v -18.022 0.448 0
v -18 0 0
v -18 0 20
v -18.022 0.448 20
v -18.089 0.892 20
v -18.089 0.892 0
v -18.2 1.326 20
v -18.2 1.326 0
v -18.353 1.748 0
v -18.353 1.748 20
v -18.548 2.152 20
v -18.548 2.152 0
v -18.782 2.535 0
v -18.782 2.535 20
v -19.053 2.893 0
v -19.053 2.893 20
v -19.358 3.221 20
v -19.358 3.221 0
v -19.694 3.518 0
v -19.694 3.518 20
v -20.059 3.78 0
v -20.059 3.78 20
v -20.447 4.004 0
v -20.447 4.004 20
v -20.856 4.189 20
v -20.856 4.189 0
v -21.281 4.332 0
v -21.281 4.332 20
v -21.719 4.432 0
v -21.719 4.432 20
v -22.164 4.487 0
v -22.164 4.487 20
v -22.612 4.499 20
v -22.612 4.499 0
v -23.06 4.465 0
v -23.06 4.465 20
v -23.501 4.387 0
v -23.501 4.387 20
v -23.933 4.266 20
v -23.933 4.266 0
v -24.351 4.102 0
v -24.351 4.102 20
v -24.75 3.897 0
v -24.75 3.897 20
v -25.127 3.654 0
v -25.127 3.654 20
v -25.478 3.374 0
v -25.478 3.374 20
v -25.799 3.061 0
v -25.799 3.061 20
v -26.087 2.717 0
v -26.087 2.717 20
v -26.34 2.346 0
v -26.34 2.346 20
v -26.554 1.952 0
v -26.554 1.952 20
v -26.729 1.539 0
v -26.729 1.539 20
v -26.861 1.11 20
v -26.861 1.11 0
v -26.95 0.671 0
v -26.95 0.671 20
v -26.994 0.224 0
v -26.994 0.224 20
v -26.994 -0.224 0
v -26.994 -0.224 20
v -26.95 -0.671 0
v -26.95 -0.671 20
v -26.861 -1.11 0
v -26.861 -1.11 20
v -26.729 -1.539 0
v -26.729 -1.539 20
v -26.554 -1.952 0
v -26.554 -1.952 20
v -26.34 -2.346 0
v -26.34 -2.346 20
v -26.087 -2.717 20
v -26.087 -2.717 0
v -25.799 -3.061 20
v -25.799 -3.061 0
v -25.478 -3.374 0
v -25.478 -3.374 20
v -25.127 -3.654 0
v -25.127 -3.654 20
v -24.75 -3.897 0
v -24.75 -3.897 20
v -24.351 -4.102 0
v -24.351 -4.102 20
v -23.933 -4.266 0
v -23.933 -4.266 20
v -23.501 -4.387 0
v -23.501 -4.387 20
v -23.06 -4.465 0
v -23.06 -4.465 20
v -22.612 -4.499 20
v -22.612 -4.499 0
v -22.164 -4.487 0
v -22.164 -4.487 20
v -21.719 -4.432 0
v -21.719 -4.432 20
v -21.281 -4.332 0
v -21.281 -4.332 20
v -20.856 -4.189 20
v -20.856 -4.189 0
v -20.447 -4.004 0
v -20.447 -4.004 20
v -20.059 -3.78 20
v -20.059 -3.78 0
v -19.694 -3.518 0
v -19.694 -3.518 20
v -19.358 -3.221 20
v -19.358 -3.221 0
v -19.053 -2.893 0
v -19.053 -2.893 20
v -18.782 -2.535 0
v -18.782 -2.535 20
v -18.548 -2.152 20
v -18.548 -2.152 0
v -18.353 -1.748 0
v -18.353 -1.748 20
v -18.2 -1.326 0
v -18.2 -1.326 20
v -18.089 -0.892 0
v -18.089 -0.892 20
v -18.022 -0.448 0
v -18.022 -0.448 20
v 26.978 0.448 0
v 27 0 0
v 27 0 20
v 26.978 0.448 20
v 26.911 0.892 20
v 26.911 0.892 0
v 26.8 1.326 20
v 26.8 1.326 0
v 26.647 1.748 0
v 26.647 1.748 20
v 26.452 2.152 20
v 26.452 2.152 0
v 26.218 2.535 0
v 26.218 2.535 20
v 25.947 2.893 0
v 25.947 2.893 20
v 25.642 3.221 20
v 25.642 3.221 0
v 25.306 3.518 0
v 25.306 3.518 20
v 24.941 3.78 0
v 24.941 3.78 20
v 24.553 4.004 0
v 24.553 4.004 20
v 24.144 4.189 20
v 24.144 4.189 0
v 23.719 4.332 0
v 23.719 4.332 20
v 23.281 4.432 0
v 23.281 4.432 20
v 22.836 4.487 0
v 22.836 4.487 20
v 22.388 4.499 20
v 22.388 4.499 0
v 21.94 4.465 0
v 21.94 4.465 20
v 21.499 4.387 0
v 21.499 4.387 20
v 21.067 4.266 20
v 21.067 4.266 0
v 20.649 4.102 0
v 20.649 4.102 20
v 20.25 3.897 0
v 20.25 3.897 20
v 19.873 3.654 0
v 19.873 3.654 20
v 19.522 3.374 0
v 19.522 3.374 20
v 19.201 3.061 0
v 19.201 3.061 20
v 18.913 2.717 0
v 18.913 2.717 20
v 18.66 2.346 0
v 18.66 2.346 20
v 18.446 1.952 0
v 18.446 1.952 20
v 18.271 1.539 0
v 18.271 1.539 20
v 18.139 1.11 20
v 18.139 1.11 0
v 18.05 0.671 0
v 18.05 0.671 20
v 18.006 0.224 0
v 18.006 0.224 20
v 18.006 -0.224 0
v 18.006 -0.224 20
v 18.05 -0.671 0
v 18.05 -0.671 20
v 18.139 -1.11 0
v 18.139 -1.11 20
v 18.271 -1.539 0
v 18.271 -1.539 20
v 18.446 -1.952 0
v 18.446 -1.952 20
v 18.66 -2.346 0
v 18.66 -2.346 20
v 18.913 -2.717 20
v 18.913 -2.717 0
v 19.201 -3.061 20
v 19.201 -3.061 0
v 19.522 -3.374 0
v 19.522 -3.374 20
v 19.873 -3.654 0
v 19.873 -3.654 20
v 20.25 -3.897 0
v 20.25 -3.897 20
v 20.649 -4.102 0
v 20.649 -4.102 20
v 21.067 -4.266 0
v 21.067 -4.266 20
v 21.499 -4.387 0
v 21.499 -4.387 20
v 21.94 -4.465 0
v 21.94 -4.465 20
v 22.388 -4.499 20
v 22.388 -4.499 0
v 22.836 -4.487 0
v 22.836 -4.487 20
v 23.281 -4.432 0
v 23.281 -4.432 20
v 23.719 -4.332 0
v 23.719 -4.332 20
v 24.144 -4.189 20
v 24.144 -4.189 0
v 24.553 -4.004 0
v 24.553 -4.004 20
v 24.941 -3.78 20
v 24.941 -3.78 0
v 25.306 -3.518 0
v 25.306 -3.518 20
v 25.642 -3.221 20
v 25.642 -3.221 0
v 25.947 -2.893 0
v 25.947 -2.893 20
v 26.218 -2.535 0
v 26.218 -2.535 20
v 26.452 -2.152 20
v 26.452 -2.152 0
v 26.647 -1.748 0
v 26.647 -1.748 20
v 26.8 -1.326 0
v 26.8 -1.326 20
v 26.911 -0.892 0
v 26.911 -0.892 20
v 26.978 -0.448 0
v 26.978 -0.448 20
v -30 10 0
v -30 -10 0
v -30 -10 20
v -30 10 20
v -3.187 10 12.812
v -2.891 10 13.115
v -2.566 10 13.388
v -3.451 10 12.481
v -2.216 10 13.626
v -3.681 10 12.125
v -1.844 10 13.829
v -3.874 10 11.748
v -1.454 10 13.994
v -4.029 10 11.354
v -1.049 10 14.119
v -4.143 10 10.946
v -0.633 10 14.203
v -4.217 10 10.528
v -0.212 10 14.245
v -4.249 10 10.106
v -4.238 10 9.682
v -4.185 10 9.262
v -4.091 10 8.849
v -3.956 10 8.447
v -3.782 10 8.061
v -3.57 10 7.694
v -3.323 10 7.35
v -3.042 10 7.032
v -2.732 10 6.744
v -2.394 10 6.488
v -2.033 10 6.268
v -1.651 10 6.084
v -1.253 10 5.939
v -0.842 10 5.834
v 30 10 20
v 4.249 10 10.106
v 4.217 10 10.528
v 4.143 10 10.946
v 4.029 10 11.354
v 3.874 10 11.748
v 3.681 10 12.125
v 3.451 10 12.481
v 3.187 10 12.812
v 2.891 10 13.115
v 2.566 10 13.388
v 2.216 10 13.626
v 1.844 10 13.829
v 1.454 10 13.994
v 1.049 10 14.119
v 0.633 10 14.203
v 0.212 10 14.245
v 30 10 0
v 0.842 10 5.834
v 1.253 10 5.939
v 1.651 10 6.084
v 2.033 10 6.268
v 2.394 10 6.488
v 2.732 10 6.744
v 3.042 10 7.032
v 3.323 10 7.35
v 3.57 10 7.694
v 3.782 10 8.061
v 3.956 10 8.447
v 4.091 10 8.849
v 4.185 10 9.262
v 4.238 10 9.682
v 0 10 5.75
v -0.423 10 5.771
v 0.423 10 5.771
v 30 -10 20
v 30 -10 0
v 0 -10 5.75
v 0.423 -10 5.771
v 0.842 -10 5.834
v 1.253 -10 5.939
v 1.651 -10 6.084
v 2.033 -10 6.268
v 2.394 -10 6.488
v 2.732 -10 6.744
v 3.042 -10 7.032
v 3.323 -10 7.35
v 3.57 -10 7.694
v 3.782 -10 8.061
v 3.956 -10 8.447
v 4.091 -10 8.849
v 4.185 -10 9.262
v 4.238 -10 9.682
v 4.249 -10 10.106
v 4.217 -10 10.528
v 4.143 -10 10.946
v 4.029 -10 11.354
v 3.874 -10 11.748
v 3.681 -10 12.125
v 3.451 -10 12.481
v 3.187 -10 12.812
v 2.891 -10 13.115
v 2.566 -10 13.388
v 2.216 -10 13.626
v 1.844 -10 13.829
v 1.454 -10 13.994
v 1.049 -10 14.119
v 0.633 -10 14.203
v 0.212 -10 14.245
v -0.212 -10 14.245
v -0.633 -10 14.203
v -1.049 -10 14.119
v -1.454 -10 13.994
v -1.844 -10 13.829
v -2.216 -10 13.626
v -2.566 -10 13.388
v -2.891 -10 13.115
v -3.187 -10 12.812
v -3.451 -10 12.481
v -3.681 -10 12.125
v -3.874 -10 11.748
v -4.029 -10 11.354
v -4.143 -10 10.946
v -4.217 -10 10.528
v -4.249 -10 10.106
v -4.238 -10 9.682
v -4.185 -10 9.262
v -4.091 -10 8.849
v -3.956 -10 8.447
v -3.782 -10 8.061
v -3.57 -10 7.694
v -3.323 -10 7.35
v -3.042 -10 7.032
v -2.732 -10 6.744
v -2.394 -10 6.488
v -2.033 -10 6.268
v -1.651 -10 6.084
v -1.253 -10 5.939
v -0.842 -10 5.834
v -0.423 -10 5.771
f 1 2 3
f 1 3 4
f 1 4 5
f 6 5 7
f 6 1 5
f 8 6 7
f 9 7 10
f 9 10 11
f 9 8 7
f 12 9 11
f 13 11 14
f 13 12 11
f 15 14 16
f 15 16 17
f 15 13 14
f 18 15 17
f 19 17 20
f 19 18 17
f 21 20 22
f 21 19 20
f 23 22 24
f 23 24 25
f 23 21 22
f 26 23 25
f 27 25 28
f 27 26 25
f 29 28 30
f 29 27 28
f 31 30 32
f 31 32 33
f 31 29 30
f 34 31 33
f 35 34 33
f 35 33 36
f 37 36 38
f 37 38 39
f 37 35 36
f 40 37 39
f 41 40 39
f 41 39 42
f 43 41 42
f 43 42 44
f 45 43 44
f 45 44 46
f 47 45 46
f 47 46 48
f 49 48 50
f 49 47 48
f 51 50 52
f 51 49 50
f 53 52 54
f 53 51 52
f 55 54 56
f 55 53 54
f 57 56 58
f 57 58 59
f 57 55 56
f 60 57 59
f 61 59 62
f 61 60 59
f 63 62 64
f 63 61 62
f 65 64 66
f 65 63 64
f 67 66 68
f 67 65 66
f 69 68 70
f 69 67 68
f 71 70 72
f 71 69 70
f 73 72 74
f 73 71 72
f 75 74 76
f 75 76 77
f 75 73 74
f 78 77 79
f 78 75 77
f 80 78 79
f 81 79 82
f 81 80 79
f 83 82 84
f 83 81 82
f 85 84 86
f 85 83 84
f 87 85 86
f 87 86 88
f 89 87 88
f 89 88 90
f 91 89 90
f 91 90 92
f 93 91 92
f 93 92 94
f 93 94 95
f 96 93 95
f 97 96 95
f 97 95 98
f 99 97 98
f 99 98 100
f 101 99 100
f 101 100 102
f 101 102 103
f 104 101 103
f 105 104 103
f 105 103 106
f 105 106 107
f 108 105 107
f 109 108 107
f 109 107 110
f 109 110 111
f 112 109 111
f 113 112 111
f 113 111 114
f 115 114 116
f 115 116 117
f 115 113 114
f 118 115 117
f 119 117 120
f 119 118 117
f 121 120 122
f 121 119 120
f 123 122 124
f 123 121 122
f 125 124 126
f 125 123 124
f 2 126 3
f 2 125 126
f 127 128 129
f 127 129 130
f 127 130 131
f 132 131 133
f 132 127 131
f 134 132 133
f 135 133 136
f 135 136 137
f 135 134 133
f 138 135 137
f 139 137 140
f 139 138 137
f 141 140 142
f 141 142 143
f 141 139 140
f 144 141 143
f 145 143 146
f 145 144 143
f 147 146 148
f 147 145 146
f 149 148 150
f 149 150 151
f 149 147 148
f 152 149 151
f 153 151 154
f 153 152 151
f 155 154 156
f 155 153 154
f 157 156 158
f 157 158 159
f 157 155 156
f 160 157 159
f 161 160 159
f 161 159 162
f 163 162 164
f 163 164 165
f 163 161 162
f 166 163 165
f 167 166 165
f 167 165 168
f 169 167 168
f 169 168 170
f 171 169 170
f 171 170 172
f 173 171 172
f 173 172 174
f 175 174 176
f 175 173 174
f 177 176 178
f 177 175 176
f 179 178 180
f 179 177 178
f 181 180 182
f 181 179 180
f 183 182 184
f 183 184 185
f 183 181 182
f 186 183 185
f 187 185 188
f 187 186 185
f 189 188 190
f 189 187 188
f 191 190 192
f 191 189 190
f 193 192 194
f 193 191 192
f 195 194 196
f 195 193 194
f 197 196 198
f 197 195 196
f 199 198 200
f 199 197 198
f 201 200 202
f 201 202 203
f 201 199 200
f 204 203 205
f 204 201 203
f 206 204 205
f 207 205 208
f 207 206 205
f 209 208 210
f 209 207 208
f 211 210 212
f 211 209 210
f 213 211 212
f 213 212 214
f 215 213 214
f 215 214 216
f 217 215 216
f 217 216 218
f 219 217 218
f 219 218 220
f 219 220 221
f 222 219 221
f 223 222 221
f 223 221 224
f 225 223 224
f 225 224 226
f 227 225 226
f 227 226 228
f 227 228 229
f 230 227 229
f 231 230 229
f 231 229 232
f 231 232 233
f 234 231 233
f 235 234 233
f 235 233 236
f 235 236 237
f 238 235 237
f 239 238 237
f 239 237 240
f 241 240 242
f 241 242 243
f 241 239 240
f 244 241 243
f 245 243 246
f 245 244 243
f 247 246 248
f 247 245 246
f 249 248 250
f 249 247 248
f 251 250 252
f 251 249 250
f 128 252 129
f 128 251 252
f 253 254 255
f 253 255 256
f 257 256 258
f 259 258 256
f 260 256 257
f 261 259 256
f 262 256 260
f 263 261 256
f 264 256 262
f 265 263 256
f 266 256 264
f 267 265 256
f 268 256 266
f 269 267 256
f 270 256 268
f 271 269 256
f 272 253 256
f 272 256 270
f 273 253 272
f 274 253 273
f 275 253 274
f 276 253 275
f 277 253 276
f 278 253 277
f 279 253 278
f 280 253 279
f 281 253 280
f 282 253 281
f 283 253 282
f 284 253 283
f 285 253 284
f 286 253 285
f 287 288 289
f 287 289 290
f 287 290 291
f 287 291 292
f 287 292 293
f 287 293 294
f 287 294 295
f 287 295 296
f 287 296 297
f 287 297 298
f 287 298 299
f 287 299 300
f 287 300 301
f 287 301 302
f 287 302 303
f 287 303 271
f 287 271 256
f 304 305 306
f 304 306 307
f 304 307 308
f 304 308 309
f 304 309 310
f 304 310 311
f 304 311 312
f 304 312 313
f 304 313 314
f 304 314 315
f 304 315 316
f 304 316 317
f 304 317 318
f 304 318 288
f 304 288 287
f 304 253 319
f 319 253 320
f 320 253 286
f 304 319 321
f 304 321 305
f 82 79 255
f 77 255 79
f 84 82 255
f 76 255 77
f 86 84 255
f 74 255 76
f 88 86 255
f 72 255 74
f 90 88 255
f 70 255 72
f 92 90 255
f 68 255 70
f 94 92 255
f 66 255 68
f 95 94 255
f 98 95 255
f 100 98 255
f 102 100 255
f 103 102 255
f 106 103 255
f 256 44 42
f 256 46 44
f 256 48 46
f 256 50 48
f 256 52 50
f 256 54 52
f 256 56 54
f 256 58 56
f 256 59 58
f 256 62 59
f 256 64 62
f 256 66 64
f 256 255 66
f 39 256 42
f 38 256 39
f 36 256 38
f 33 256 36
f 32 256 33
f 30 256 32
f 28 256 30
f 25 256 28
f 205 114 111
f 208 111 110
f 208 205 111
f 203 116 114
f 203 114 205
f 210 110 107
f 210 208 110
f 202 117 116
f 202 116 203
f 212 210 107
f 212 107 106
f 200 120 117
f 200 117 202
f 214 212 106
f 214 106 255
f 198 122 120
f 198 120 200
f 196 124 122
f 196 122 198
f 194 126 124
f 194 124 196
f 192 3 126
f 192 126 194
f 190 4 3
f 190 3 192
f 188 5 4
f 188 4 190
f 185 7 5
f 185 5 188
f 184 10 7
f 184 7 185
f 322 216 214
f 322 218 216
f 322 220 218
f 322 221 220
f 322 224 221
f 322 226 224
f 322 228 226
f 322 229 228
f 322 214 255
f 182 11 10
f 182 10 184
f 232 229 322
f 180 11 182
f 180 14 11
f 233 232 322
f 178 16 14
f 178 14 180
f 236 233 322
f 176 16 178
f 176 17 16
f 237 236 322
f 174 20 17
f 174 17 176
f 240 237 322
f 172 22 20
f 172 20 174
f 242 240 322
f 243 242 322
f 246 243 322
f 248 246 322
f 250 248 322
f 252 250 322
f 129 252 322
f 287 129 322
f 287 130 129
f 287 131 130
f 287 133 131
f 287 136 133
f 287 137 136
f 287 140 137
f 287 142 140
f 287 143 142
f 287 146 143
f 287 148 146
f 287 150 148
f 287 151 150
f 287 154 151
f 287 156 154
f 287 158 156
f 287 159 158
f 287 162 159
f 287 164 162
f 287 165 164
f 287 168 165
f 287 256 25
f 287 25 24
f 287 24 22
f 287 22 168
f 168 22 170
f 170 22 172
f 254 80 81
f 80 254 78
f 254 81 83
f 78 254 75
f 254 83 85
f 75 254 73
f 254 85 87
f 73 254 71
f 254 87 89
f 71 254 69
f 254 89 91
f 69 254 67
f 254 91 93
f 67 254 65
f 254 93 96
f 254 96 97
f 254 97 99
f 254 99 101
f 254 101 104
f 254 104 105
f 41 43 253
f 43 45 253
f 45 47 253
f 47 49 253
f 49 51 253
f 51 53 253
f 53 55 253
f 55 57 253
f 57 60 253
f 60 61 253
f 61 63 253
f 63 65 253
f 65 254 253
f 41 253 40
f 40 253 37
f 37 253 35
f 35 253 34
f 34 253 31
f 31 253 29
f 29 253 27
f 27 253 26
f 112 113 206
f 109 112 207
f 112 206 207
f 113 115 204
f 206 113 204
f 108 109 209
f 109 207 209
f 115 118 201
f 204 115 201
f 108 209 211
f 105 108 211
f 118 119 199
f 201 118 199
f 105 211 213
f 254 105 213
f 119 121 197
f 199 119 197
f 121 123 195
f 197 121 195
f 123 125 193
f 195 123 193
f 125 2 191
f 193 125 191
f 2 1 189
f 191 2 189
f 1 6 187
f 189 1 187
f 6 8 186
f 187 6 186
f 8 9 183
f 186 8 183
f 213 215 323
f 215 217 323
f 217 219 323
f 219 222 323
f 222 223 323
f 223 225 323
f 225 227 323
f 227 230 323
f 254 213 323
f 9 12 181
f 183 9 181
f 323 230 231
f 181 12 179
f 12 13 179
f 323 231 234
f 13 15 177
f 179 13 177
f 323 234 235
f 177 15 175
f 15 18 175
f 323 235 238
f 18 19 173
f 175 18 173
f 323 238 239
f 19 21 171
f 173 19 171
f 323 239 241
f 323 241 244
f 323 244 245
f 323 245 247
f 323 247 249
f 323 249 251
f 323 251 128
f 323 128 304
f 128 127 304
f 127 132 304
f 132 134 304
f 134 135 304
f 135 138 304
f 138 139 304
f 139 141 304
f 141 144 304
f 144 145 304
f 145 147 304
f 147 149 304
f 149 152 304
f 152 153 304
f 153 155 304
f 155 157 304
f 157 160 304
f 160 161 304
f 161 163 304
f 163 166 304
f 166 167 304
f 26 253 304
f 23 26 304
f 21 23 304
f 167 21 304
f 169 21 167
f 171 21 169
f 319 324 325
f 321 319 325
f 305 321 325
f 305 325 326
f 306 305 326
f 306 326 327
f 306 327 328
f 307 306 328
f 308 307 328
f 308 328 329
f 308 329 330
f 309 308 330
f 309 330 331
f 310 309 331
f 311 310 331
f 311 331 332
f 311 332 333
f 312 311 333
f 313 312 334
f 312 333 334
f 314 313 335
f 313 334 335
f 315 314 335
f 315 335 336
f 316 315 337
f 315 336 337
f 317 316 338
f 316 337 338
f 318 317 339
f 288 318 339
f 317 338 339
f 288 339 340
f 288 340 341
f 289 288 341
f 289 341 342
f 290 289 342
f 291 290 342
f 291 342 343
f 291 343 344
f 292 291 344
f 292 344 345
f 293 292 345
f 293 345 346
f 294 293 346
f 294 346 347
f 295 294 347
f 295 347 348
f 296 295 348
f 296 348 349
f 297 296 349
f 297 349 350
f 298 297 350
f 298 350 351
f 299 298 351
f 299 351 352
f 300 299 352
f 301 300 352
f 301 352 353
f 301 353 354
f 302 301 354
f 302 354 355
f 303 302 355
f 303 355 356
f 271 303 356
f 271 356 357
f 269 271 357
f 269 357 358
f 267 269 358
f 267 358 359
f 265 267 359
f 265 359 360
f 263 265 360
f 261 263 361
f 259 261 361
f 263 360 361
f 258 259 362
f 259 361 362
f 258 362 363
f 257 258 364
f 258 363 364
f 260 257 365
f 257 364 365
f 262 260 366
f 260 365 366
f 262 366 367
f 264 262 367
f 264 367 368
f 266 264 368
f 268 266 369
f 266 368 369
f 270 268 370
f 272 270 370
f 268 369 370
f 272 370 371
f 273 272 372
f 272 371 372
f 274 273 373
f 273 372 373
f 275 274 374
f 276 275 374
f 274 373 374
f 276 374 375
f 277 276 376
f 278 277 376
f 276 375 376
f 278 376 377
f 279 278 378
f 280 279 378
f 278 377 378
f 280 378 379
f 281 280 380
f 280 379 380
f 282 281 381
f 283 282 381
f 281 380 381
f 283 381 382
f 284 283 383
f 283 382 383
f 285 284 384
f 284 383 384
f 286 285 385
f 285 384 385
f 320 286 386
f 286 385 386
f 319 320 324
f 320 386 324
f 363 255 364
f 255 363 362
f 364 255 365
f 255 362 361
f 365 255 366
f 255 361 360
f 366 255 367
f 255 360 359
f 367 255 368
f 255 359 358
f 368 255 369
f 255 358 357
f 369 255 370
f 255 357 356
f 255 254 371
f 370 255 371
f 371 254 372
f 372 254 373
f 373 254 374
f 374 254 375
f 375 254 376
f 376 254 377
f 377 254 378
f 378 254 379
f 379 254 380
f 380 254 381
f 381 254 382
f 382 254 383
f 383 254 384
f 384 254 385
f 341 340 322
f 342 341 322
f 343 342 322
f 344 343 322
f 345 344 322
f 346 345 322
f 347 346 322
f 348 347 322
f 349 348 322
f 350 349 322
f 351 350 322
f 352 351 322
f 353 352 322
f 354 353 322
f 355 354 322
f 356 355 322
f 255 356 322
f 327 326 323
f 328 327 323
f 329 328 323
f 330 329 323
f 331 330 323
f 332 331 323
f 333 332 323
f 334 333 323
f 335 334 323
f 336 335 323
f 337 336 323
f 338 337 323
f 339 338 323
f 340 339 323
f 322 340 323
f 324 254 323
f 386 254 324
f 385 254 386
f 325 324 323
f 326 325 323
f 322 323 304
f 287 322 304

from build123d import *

# Parameters (mm, degrees)
SKETCH_1_W              = 60
SKETCH_1_H              = 20
SKETCH_1_R              = 4.5
EXTRUDE_1_DEPTH         = 20
HOLE_WIZARD_M10_1_D     = 8.5
HOLE_WIZARD_M10_1_DEPTH = 24.5
HOLE_WIZARD_M10_1_TIP   = 2.553657631


with BuildPart() as part:
    # 草图1 → 凸台-拉伸1 (new body)
    with BuildSketch(Plane.XY):
        Rectangle(SKETCH_1_W, SKETCH_1_H)
        with Locations((-22.5, 0)):
            Circle(SKETCH_1_R, mode=Mode.SUBTRACT)
        with Locations((22.5, 0)):
            Circle(SKETCH_1_R, mode=Mode.SUBTRACT)
    extrude(amount=EXTRUDE_1_DEPTH)

    # M10 螺纹孔1
    with Locations(Plane(origin=(0, 10, 10), x_dir=(0, 0, 1), z_dir=(0, 1, 0))):
        with Locations((0, 0)):
            Hole(HOLE_WIZARD_M10_1_D / 2, depth=HOLE_WIZARD_M10_1_DEPTH)
            with Locations((0, 0, -(HOLE_WIZARD_M10_1_DEPTH + HOLE_WIZARD_M10_1_TIP / 2))):  # 118° drill point
                Cone(0, HOLE_WIZARD_M10_1_D / 2, HOLE_WIZARD_M10_1_TIP, mode=Mode.SUBTRACT)


solid = part.part
